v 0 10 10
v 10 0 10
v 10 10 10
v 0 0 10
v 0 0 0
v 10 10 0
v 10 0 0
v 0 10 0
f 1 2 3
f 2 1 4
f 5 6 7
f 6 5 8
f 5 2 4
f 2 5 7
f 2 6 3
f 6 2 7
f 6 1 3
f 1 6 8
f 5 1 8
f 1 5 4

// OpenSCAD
// `$preview` must be false during an exact render/export (OpenSCAD's F6), so an
// export takes the `else` branch. The oracle runs `--export-format binstl`,
// which is an exact render; seeding `$preview = true` here would export a
// sphere of volume ~33500 instead of this cube's 1000.
if ($preview) sphere(20); else cube(10);
